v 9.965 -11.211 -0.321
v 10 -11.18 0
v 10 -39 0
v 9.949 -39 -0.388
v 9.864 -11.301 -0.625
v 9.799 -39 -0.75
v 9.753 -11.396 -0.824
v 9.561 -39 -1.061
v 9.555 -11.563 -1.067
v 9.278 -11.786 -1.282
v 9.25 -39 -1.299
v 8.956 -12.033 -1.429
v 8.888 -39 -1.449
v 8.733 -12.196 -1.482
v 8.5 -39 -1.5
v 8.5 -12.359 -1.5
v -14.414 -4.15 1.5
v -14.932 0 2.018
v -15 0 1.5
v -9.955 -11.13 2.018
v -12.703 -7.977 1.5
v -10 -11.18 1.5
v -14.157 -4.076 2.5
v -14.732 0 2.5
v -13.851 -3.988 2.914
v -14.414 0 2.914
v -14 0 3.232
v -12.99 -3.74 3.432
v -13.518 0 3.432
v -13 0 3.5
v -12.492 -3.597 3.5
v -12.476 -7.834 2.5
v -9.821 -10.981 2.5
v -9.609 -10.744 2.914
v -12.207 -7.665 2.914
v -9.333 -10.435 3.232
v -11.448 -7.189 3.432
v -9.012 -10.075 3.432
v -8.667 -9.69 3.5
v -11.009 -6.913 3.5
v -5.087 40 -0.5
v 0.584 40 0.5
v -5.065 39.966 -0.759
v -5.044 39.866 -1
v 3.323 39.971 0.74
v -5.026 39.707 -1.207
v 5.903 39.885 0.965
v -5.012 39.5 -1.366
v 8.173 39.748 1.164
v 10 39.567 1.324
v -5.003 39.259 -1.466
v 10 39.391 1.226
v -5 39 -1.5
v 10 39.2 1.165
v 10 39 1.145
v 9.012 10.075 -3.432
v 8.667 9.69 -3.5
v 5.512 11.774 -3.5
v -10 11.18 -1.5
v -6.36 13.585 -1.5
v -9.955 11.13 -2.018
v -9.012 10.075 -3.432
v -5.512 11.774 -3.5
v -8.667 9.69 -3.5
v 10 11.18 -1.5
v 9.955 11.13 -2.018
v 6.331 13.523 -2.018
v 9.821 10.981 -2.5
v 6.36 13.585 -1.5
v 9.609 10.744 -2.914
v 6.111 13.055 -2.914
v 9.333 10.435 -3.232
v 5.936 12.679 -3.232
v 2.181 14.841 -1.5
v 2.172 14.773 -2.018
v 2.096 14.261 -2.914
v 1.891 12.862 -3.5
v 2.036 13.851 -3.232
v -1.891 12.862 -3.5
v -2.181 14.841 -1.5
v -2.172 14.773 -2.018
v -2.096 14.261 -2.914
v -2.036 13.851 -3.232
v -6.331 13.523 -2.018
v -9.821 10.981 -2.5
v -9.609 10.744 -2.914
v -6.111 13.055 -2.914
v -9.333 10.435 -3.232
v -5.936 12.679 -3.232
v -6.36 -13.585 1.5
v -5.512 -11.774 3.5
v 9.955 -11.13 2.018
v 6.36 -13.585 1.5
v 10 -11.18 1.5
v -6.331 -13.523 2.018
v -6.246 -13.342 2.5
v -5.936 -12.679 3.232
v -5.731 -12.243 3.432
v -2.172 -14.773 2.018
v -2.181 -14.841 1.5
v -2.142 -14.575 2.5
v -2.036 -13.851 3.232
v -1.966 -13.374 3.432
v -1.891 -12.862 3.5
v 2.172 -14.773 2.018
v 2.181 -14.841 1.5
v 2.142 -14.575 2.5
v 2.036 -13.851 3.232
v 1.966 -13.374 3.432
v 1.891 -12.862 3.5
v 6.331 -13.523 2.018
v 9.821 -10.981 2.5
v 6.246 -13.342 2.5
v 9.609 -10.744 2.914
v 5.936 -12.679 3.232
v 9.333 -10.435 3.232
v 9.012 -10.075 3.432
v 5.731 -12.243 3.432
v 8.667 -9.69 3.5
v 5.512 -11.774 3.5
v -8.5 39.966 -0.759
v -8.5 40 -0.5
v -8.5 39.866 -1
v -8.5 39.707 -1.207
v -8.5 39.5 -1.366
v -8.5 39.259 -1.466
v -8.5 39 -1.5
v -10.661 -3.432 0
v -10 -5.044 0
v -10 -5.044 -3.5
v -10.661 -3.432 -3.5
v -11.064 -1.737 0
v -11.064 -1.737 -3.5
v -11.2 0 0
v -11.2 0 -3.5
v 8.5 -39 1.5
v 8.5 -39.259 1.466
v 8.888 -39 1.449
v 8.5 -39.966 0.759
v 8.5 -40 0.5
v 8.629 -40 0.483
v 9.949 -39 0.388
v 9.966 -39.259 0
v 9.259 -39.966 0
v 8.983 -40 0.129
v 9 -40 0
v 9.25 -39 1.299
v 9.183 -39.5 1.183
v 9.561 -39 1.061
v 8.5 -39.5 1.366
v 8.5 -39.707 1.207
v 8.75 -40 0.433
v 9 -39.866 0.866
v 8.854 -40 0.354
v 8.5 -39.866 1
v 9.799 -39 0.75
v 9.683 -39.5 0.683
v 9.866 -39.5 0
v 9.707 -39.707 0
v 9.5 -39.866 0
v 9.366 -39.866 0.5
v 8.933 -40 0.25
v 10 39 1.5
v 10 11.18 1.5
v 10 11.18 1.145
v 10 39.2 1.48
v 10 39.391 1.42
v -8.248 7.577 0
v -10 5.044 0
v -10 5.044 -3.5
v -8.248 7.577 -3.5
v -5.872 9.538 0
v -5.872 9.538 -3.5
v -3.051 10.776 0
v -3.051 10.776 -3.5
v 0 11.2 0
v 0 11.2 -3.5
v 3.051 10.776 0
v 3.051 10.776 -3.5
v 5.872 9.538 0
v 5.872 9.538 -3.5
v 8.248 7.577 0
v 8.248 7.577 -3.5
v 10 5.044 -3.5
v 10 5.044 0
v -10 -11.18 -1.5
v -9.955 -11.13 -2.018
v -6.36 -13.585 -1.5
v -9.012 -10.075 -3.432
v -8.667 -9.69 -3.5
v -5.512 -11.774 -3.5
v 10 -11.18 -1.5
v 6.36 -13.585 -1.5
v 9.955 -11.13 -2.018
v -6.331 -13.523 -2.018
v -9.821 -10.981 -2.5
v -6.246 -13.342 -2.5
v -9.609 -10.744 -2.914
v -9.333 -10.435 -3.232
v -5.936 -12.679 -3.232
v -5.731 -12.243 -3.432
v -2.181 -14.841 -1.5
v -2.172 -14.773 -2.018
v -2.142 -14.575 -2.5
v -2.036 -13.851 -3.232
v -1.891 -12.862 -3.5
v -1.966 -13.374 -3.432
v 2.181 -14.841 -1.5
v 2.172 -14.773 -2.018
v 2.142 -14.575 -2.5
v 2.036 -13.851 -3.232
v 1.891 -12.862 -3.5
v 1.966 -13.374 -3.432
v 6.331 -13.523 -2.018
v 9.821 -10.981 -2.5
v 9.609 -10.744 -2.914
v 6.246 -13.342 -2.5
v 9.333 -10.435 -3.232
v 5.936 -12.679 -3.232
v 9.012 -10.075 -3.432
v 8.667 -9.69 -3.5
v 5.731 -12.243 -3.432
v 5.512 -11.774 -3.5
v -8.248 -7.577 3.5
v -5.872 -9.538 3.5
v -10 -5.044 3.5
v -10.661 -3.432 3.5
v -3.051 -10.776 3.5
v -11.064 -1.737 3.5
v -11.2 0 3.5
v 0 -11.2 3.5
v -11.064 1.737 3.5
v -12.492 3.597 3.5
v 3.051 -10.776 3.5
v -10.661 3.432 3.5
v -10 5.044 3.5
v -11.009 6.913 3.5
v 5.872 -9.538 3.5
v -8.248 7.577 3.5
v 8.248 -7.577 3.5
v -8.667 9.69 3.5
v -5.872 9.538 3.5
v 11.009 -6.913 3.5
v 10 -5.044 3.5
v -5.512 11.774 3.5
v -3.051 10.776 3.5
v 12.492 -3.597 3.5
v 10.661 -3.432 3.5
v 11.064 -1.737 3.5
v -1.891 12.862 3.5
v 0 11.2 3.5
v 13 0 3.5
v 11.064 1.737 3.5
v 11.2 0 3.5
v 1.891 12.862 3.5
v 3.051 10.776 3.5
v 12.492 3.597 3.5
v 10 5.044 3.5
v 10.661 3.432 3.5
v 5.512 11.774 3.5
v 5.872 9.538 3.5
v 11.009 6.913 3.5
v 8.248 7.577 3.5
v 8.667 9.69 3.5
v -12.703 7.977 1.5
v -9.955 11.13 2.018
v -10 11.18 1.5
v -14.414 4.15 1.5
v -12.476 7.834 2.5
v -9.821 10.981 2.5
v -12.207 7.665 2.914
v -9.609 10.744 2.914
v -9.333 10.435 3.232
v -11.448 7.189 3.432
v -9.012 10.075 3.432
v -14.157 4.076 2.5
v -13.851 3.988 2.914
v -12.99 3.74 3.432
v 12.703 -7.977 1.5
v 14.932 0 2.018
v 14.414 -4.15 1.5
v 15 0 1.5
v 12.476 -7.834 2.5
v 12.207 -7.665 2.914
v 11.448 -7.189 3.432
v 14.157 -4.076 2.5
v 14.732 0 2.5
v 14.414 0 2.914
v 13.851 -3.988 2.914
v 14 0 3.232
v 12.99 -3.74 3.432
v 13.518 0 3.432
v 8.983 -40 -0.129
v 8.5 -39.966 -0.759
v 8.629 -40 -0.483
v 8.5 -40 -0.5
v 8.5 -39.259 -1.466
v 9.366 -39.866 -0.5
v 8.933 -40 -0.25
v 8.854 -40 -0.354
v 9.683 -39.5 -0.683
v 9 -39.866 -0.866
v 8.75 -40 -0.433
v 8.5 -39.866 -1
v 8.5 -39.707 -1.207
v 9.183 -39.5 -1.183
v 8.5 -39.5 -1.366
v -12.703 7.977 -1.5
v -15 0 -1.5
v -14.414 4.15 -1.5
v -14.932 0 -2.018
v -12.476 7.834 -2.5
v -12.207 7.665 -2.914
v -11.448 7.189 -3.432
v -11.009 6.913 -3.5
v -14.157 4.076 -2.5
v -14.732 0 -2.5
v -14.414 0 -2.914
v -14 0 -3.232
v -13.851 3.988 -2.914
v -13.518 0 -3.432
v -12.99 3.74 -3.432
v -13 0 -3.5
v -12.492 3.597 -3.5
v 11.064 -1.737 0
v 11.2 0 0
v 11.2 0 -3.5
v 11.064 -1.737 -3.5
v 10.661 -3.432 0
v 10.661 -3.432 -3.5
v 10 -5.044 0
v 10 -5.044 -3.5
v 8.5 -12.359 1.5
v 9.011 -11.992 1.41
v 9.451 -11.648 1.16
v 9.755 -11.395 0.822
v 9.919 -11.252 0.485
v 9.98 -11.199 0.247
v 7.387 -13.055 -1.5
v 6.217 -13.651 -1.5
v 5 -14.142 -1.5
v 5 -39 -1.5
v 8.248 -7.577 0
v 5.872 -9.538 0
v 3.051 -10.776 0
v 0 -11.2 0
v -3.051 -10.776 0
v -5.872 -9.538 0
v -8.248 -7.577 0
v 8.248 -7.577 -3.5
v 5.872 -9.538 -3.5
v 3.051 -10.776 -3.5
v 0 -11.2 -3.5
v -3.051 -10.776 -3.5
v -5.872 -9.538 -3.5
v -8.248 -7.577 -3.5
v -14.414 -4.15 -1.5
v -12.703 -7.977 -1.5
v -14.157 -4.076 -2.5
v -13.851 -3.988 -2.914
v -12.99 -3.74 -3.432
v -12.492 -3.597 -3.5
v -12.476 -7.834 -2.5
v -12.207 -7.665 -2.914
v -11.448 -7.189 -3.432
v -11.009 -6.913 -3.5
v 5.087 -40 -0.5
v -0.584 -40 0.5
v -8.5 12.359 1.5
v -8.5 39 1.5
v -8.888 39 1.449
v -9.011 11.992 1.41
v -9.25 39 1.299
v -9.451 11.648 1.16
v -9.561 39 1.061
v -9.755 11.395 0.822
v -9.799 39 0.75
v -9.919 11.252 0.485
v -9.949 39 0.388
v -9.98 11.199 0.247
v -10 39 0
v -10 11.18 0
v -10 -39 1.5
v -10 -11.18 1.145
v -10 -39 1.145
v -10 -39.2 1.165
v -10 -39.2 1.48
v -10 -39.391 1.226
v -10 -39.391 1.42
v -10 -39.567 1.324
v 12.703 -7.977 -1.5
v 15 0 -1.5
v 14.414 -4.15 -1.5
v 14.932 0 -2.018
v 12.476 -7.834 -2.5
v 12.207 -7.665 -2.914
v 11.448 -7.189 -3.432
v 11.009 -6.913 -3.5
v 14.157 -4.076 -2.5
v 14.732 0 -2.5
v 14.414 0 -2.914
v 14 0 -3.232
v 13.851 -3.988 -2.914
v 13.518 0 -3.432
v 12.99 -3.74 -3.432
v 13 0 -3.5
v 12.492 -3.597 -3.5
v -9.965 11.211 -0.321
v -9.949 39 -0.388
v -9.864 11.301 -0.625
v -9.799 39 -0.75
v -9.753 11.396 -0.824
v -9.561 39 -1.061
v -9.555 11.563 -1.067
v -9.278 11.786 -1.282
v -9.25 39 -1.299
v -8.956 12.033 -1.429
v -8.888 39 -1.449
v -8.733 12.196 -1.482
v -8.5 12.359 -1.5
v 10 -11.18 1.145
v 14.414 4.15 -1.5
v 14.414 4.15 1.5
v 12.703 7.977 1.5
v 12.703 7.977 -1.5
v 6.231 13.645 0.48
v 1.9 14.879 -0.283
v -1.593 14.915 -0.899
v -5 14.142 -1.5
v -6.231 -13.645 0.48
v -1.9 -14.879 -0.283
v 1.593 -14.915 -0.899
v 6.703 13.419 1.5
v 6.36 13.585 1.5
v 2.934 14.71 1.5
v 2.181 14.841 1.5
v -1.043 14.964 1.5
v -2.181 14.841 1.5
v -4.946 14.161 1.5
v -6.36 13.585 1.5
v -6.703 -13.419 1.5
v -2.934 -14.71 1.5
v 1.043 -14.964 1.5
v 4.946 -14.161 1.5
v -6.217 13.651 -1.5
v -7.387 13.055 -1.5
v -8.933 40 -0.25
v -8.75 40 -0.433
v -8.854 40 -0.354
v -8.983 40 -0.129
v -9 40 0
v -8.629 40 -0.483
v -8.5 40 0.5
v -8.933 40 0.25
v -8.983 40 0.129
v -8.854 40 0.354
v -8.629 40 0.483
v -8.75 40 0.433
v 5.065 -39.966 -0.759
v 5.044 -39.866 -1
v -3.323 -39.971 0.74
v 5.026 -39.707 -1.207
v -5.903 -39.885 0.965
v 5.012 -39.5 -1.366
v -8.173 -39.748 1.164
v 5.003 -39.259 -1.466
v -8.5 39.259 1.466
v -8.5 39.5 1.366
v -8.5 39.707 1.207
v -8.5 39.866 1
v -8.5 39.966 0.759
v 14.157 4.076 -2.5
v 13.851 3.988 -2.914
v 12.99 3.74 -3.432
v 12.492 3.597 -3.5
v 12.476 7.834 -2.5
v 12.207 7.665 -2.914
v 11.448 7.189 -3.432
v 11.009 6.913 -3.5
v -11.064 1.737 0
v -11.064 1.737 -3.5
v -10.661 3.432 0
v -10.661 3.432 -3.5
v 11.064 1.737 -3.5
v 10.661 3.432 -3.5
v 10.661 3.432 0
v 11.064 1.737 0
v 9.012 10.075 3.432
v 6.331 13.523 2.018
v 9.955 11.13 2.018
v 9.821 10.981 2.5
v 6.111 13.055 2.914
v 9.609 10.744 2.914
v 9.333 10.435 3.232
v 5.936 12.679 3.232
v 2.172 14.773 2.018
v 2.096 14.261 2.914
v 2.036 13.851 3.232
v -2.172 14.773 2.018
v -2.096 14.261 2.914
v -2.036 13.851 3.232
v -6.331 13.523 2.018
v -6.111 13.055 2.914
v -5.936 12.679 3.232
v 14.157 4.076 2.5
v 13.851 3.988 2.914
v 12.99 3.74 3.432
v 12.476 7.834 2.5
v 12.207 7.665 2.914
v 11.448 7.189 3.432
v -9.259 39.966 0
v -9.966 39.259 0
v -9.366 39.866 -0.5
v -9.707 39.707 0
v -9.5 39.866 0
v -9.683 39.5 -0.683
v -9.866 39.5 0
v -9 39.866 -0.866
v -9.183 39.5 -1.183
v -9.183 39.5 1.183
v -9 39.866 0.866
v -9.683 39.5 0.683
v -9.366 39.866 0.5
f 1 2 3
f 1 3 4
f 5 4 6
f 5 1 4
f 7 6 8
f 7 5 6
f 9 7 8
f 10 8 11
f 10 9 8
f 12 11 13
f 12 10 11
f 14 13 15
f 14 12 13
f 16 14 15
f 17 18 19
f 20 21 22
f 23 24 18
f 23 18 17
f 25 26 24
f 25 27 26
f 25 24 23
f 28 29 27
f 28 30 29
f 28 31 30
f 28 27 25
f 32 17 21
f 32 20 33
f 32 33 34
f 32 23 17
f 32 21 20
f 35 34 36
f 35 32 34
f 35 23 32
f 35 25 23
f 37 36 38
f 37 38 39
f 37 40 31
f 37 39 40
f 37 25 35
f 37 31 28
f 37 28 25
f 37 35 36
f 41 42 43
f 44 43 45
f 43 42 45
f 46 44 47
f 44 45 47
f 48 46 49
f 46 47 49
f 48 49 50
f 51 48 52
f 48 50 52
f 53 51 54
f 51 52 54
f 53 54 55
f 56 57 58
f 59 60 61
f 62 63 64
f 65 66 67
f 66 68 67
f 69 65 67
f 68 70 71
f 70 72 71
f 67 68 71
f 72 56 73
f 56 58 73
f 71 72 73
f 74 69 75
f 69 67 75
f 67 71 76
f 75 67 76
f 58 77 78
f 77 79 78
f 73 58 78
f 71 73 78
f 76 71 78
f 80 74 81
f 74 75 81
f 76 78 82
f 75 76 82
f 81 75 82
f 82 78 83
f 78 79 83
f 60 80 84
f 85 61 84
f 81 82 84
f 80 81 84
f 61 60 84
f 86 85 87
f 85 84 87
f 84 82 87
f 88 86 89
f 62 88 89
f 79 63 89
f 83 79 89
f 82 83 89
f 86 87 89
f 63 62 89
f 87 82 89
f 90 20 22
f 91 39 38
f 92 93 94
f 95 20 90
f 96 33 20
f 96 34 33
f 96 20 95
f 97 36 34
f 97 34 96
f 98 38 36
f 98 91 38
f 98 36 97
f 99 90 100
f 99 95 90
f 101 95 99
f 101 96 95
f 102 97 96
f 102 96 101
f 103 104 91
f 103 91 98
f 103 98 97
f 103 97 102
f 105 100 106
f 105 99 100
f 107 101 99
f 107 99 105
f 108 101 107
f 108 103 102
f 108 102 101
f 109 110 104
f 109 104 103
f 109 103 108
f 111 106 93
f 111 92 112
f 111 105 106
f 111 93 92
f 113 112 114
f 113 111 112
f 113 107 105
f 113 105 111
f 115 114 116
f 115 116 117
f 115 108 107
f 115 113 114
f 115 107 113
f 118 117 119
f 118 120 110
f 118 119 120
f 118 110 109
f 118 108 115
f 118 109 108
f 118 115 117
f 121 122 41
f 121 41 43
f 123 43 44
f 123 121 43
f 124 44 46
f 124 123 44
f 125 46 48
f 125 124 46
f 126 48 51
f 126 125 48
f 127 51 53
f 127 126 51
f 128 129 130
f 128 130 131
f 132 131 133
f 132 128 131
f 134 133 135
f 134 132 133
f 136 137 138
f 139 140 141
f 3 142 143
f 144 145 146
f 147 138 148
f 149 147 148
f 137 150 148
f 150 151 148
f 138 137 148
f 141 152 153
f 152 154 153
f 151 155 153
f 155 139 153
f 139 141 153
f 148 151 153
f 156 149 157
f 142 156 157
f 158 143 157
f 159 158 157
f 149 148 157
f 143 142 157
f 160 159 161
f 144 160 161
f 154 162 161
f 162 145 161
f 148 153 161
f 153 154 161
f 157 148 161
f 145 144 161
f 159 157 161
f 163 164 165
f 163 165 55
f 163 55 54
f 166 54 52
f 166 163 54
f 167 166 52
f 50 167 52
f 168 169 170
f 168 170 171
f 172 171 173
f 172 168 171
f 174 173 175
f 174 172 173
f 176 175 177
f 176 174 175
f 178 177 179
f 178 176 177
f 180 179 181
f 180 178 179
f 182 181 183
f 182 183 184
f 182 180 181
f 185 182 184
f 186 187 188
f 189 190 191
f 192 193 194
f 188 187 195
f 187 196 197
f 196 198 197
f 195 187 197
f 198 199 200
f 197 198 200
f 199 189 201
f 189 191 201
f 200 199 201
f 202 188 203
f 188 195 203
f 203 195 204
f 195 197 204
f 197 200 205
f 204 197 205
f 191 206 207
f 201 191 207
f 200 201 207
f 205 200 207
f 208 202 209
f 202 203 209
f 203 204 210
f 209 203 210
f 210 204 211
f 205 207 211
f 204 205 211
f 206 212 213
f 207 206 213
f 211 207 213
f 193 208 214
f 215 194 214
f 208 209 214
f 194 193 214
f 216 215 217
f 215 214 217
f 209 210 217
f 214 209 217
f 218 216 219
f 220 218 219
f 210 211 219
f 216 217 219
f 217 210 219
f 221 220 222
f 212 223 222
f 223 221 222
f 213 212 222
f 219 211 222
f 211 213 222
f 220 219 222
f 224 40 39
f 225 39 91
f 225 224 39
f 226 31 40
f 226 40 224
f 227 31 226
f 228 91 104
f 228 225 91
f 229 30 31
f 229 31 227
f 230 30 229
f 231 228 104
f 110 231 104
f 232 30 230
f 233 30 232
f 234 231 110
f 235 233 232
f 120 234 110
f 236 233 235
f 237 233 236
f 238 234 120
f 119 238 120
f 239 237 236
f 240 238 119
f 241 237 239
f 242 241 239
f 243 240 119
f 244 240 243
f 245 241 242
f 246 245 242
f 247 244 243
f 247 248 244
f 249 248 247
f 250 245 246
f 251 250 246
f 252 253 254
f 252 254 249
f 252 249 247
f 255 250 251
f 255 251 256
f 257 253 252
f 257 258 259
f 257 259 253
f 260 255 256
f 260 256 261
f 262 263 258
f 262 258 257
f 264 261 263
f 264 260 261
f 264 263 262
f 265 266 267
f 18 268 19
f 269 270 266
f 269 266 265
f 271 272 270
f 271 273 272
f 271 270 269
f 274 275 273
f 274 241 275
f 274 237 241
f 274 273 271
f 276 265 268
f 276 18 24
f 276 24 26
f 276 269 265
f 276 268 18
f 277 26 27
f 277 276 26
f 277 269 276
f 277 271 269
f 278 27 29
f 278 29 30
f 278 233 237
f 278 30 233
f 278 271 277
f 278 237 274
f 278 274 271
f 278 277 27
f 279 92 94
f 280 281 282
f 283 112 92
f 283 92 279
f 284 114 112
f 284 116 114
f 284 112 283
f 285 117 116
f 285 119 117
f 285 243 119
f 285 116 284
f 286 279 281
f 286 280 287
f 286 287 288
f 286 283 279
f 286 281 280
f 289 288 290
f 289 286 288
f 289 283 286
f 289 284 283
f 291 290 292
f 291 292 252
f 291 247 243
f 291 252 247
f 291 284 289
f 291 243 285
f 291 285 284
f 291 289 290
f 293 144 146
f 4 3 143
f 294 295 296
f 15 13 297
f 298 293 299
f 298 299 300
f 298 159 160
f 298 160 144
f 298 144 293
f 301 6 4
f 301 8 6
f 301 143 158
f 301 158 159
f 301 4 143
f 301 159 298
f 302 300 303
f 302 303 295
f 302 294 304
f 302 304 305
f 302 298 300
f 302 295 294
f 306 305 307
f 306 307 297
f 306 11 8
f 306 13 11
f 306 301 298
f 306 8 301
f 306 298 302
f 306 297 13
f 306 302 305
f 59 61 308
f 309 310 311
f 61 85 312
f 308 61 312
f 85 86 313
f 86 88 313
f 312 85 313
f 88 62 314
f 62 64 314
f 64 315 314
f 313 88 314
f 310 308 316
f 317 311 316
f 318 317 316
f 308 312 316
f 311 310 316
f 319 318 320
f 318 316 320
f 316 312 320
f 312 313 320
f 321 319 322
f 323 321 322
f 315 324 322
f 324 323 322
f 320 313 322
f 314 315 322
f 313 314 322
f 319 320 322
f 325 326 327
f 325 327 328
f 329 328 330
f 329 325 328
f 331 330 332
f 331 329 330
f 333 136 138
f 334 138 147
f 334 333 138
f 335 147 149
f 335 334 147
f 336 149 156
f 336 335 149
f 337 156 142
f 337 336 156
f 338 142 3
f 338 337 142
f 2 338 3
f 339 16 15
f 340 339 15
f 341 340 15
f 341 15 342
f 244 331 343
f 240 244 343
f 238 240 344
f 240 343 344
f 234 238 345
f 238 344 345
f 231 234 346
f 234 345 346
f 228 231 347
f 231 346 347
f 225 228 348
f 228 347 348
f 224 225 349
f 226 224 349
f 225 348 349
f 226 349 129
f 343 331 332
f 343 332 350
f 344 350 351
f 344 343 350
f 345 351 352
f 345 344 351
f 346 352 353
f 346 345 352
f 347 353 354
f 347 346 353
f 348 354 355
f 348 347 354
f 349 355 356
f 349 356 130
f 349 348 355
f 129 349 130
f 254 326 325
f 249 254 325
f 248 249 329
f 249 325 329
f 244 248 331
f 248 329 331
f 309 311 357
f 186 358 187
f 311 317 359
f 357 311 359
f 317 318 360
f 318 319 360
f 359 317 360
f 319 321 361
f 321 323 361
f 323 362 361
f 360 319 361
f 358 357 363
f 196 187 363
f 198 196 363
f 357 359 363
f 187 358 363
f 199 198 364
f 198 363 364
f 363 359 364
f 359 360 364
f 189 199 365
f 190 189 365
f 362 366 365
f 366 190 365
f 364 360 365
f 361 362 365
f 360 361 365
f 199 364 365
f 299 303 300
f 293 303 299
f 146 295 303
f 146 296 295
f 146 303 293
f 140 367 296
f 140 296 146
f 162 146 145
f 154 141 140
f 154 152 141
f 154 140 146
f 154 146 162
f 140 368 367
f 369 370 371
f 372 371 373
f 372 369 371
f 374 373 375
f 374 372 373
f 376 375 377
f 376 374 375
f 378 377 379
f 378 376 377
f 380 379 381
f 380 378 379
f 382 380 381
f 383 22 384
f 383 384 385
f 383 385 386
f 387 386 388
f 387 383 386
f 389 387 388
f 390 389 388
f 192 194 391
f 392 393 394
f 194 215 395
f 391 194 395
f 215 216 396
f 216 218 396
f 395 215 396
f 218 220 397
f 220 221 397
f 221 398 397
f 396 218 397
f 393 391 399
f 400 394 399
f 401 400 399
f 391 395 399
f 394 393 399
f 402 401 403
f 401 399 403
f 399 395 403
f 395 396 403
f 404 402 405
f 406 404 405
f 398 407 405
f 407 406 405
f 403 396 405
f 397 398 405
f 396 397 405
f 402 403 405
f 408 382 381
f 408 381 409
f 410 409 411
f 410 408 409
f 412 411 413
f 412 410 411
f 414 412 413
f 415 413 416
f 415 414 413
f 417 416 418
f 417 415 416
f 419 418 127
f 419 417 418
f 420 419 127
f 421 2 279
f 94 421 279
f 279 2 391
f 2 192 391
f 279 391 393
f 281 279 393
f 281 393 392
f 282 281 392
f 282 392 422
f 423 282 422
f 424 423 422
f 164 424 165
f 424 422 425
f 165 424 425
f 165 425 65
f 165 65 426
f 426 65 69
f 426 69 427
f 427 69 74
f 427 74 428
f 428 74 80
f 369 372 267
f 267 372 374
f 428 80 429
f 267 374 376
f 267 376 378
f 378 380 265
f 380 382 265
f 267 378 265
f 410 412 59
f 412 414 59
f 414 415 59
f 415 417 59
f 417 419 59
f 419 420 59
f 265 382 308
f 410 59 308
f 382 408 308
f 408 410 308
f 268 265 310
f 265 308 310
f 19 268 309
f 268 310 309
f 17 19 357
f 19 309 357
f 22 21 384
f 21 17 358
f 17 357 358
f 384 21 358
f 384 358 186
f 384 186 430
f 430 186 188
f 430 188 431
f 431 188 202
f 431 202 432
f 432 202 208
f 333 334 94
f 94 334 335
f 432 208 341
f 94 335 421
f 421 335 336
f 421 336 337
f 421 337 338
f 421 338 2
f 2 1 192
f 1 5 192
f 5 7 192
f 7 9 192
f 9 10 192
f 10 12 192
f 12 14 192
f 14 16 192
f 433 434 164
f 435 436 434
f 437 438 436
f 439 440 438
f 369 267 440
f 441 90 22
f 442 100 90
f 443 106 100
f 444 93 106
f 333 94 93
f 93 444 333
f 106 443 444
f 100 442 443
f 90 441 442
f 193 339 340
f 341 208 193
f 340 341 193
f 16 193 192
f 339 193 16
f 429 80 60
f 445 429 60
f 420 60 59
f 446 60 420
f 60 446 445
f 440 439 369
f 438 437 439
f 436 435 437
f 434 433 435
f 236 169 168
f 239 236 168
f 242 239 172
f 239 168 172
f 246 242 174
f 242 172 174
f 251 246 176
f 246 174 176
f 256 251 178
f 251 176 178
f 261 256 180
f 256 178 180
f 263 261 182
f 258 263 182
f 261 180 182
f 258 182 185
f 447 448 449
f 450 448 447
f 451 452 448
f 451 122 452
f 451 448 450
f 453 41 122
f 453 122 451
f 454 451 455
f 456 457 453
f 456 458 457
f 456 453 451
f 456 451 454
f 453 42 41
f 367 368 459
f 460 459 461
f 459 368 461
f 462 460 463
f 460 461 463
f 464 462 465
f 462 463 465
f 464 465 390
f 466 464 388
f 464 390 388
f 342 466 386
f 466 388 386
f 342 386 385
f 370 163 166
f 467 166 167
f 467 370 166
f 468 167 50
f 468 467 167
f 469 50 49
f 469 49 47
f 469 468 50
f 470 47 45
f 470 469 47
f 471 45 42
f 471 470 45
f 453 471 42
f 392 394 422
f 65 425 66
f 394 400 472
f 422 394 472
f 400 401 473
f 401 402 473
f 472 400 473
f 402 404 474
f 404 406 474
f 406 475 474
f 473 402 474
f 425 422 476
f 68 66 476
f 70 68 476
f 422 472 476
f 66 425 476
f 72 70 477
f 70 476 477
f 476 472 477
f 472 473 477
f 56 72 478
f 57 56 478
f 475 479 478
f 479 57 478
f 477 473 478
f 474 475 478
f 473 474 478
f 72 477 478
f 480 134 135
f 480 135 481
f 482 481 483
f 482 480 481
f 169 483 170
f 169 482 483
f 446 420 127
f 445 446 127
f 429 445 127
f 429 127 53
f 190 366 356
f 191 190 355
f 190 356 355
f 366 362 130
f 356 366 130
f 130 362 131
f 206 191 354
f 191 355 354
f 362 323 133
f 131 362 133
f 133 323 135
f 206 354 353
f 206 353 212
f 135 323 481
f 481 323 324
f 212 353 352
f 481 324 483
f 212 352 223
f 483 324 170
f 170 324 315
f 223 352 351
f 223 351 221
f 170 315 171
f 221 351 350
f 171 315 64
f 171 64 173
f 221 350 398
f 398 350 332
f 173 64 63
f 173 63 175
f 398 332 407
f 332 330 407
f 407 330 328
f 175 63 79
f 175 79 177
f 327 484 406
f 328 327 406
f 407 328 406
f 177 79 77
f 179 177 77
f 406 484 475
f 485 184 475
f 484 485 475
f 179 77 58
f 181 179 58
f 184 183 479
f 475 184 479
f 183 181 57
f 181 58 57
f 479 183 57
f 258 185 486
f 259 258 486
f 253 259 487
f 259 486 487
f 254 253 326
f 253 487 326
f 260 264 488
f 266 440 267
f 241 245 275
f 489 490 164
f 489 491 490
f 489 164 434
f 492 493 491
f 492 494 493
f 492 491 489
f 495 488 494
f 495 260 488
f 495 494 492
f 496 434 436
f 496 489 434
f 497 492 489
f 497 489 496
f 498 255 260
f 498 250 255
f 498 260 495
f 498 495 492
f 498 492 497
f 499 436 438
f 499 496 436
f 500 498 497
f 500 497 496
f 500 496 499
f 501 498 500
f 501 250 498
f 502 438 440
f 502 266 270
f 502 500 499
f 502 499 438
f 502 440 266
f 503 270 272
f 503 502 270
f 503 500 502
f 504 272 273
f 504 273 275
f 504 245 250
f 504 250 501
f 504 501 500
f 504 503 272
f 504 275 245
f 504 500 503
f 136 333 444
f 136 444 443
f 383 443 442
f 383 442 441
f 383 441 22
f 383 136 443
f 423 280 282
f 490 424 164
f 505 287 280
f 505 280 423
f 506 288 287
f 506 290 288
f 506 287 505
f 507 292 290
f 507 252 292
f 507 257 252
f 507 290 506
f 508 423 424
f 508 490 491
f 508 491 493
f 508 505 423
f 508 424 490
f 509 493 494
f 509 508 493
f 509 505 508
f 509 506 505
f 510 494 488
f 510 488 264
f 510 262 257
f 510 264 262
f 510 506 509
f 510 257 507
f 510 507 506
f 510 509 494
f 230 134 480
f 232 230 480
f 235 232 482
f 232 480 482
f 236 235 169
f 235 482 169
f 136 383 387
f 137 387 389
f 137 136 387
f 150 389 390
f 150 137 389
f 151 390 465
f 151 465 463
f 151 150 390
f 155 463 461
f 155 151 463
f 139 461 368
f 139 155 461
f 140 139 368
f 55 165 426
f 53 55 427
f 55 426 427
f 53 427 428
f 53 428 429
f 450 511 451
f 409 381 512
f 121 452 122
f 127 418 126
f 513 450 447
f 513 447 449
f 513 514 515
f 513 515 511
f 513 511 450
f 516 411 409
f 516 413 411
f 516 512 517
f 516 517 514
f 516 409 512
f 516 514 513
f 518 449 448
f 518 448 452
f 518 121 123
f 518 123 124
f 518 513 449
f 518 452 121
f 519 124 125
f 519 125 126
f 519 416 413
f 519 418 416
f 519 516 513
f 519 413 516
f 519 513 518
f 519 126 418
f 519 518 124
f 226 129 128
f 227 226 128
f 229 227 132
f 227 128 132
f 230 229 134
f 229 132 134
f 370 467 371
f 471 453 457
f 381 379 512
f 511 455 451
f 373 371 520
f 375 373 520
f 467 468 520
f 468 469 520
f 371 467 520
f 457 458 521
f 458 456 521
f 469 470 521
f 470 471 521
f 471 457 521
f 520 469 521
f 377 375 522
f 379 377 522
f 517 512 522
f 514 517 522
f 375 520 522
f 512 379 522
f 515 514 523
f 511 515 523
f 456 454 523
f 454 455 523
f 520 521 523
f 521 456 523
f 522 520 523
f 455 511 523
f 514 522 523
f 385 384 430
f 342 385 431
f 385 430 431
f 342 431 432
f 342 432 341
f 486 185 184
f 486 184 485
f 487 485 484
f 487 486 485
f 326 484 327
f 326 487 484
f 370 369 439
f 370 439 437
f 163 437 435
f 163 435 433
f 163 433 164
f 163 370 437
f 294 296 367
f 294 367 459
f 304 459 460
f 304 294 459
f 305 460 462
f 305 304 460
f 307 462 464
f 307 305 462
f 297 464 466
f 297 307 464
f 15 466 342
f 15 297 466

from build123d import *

# Parameters (mm, degrees)
F1_DEPTH      = 3.5
F1_DEPTH_BACK = 3.5
F2_DEPTH      = 1.5
F2_DEPTH_BACK = 1.5
F3_R          = 1.99999
F4_T4_DEPTH   = 106.7758240051
F4_S5_R       = 15
F4_T6_DEPTH   = 55
F5_R          = 1.49999
F7_T1_DEPTH   = 11.00001
F7_T3_DEPTH   = 25.2313991783
F7_T5_DEPTH   = 21.00001
F7_T7_DEPTH   = 2e-05
F7_T10_ANGLE  = 90
F7_T12_ANGLE  = 90
F8_COUNT      = 2


# Not quite as in the source:
# - a fillet or chamfer that OpenCascade refuses, or shapes differently, is made with other operations: its cross-section is extruded or revolved along the edge and cut away or added
# - a fillet or chamfer is up to 0.001 mm smaller than in the source, because OpenCascade refuses the exact size
# - a feature names something its author has since deleted; it is built from what else it names


with BuildPart() as f1:
    # F0 (on Top) → F1 (new body, two sides)
    with BuildSketch(Plane.XY) as f1_sk:
        with BuildLine():
            ThreePointArc((-10, -5.0438080852), (-11.2, 0), (-10, 5.0438080852))
            Line((-10, 5.0438080852), (-10, 11.1803398875))
            ThreePointArc((-10, 11.1803398875), (-15, 0), (-10, -11.1803398875))
            Line((-10, -11.1803398875), (-10, -5.0438080852))
        make_face()
        with BuildLine():
            ThreePointArc((-10, 5.0438080852), (0, 11.2), (10, 5.0438080852))
            Line((10, 5.0438080852), (10, 11.1803398875))
            ThreePointArc((10, 11.1803398875), (0, 15), (-10, 11.1803398875))
            Line((-10, 11.1803398875), (-10, 5.0438080852))
        make_face()
        with BuildLine():
            ThreePointArc((10, 5.0438080852), (10.8958707775, 2.5922962794), (11.2, 0))
            ThreePointArc((11.2, 0), (10.8958707775, -2.5922962794), (10, -5.0438080852))
            Line((10, -5.0438080852), (10, -11.1803398875))
            ThreePointArc((10, -11.1803398875), (13.6930639376, -6.123724357), (15, 0))
            ThreePointArc((15, 0), (13.6930639376, 6.123724357), (10, 11.1803398875))
            Line((10, 11.1803398875), (10, 5.0438080852))
        make_face()
        with BuildLine():
            Line((10, -11.1803398875), (10, -5.0438080852))
            ThreePointArc((10, -5.0438080852), (0, -11.2), (-10, -5.0438080852))
            Line((-10, -5.0438080852), (-10, -11.1803398875))
            ThreePointArc((-10, -11.1803398875), (0, -15), (10, -11.1803398875))
        make_face()
    extrude(amount=F1_DEPTH)
    extrude(f1_sk.sketch, amount=-F1_DEPTH_BACK)

    # F0 (on Top) → F2 (join, two sides)
    with BuildSketch(Plane.XY) as f2_sk:
        with BuildLine():
            ThreePointArc((-10, 11.1803398875), (0, 15), (10, 11.1803398875))
            Line((10, 11.1803398875), (10, 40))
            Line((10, 40), (-10, 40))
            Line((-10, 40), (-10, 11.1803398875))
        make_face()
    extrude(amount=F2_DEPTH)
    extrude(f2_sk.sketch, amount=-F2_DEPTH_BACK)

    # F3 (radius 2 in the source; OpenCascade refuses exactly that, so slightly less here)
    f3_edges = [f1.edges().sort_by_distance(p)[0] for p in [
        (10, 11.18034, 3.5),
        (10, 11.18034, -3.5),
    ]]
    fillet(f3_edges, radius=F3_R)

    # F4: chamfer of 15 x 2.6449047106 on 1 edges, made by hand


with BuildPart() as f4_tool2:
    # F4_s3 → F4_t4 (new body)
    with BuildSketch(Plane.XZ.offset(27.7977420588)):
        Polygon((10, 1.1449047106), (-5, -1.5), (10, -1.5), align=None)
    extrude(amount=-F4_T4_DEPTH)

    # F4_s5 → F4_t6 (cut, symmetric)
    with BuildSketch(Plane.XY.offset(-0.2)):
        Circle(F4_S5_R)
    extrude(amount=F4_T6_DEPTH, both=True, mode=Mode.SUBTRACT)


with BuildPart() as f1_1:
    add(f1.part)

    # F4_t1: cut F4_tool2
    add(f4_tool2.part, mode=Mode.SUBTRACT)

    # F5 (radius 1.5 in the source; OpenCascade refuses exactly that, so slightly less here)
    f5_edges = [f1_1.edges().sort_by_distance(p)[0] for p in [
        (-10, 25.59017, -1.5),
        (-10, 25.59017, 1.5),
    ]]
    fillet(f5_edges, radius=F5_R)

    # F7: fillet of radius 1 on 6 edges, made by hand

    # F7_s2 → F7_t1 (cut)
    with BuildSketch(Plane.YZ.offset(-8.50001)):
        with BuildLine():
            ThreePointArc((40, -0.5), (39.7071067812, -1.2071067812), (39, -1.5))
            Line((39, -1.5), (40, -1.5))
            Line((40, -1.5), (40, -0.5))
        make_face()
    extrude(amount=F7_T1_DEPTH, mode=Mode.SUBTRACT)

    # F7_s4 → F7_t3 (cut)
    with BuildSketch(Plane(origin=(12.3562727231, 0, 2.178744262), x_dir=(0, 1, 0), z_dir=(-0.984807753, 0, -0.1736481777))):
        with BuildLine():
            ThreePointArc((40, -0.3910292588), (39.7071067812, 0.3160775224), (39, 0.6089707412))
            Line((39, 0.6089707412), (40, 0.6089707412))
            Line((40, 0.6089707412), (40, -0.3910292588))
        make_face()
    extrude(amount=F7_T3_DEPTH, mode=Mode.SUBTRACT)

    # F7_s6 → F7_t5 (cut)
    with BuildSketch(Plane.YZ.offset(-8.50001)):
        with BuildLine():
            ThreePointArc((39, 1.5), (39.7071067812, 1.2071067812), (40, 0.5))
            Line((40, 0.5), (40, 1.5))
            Line((40, 1.5), (39, 1.5))
        make_face()
    extrude(amount=F7_T5_DEPTH, mode=Mode.SUBTRACT)

    # F7_s8 → F7_t7 (cut)
    with BuildSketch(Plane.XY.offset(-1e-05)):
        with BuildLine():
            ThreePointArc((-10, 39), (-9.7071067812, 39.7071067812), (-9, 40))
            Line((-9, 40), (-10, 40))
            Line((-10, 40), (-10, 39))
        make_face()
    extrude(amount=F7_T7_DEPTH, mode=Mode.SUBTRACT)

    # F7_s9 → F7_t10 (revolve, cut)
    with BuildSketch(Plane.XY.offset(-1e-05)):
        with BuildLine():
            ThreePointArc((-9, 40), (-9.7071067812, 39.7071067812), (-10, 39))
            Line((-10, 39), (-10, 40))
            Line((-10, 40), (-9, 40))
        make_face()
    revolve(axis=Axis((-8.50001, 40, -1e-05), (0, -1, 0)), revolution_arc=F7_T10_ANGLE, mode=Mode.SUBTRACT)

    # F7_s11 → F7_t12 (revolve, cut)
    with BuildSketch(Plane.YZ.offset(-8.50001)):
        with BuildLine():
            ThreePointArc((39, 1.5), (39.7071067812, 1.2071067812), (40, 0.5))
            Line((40, 0.5), (40, 1.5))
            Line((40, 1.5), (39, 1.5))
        make_face()
    revolve(axis=Axis((-8.50001, 40, 1e-05), (0, -1, 0)), revolution_arc=F7_T12_ANGLE, mode=Mode.SUBTRACT)

    # F8: F1 ×2 about axis
    f8_axis = Axis((0, 0, -0.2721771598), (0, 0, -1))


with BuildPart() as f1_2:
    add(f1_1.part)
    for i in range(1, F8_COUNT):
        add(f1_1.part.rotate(f8_axis, i * 360 / F8_COUNT))


solid = f1_2.part
